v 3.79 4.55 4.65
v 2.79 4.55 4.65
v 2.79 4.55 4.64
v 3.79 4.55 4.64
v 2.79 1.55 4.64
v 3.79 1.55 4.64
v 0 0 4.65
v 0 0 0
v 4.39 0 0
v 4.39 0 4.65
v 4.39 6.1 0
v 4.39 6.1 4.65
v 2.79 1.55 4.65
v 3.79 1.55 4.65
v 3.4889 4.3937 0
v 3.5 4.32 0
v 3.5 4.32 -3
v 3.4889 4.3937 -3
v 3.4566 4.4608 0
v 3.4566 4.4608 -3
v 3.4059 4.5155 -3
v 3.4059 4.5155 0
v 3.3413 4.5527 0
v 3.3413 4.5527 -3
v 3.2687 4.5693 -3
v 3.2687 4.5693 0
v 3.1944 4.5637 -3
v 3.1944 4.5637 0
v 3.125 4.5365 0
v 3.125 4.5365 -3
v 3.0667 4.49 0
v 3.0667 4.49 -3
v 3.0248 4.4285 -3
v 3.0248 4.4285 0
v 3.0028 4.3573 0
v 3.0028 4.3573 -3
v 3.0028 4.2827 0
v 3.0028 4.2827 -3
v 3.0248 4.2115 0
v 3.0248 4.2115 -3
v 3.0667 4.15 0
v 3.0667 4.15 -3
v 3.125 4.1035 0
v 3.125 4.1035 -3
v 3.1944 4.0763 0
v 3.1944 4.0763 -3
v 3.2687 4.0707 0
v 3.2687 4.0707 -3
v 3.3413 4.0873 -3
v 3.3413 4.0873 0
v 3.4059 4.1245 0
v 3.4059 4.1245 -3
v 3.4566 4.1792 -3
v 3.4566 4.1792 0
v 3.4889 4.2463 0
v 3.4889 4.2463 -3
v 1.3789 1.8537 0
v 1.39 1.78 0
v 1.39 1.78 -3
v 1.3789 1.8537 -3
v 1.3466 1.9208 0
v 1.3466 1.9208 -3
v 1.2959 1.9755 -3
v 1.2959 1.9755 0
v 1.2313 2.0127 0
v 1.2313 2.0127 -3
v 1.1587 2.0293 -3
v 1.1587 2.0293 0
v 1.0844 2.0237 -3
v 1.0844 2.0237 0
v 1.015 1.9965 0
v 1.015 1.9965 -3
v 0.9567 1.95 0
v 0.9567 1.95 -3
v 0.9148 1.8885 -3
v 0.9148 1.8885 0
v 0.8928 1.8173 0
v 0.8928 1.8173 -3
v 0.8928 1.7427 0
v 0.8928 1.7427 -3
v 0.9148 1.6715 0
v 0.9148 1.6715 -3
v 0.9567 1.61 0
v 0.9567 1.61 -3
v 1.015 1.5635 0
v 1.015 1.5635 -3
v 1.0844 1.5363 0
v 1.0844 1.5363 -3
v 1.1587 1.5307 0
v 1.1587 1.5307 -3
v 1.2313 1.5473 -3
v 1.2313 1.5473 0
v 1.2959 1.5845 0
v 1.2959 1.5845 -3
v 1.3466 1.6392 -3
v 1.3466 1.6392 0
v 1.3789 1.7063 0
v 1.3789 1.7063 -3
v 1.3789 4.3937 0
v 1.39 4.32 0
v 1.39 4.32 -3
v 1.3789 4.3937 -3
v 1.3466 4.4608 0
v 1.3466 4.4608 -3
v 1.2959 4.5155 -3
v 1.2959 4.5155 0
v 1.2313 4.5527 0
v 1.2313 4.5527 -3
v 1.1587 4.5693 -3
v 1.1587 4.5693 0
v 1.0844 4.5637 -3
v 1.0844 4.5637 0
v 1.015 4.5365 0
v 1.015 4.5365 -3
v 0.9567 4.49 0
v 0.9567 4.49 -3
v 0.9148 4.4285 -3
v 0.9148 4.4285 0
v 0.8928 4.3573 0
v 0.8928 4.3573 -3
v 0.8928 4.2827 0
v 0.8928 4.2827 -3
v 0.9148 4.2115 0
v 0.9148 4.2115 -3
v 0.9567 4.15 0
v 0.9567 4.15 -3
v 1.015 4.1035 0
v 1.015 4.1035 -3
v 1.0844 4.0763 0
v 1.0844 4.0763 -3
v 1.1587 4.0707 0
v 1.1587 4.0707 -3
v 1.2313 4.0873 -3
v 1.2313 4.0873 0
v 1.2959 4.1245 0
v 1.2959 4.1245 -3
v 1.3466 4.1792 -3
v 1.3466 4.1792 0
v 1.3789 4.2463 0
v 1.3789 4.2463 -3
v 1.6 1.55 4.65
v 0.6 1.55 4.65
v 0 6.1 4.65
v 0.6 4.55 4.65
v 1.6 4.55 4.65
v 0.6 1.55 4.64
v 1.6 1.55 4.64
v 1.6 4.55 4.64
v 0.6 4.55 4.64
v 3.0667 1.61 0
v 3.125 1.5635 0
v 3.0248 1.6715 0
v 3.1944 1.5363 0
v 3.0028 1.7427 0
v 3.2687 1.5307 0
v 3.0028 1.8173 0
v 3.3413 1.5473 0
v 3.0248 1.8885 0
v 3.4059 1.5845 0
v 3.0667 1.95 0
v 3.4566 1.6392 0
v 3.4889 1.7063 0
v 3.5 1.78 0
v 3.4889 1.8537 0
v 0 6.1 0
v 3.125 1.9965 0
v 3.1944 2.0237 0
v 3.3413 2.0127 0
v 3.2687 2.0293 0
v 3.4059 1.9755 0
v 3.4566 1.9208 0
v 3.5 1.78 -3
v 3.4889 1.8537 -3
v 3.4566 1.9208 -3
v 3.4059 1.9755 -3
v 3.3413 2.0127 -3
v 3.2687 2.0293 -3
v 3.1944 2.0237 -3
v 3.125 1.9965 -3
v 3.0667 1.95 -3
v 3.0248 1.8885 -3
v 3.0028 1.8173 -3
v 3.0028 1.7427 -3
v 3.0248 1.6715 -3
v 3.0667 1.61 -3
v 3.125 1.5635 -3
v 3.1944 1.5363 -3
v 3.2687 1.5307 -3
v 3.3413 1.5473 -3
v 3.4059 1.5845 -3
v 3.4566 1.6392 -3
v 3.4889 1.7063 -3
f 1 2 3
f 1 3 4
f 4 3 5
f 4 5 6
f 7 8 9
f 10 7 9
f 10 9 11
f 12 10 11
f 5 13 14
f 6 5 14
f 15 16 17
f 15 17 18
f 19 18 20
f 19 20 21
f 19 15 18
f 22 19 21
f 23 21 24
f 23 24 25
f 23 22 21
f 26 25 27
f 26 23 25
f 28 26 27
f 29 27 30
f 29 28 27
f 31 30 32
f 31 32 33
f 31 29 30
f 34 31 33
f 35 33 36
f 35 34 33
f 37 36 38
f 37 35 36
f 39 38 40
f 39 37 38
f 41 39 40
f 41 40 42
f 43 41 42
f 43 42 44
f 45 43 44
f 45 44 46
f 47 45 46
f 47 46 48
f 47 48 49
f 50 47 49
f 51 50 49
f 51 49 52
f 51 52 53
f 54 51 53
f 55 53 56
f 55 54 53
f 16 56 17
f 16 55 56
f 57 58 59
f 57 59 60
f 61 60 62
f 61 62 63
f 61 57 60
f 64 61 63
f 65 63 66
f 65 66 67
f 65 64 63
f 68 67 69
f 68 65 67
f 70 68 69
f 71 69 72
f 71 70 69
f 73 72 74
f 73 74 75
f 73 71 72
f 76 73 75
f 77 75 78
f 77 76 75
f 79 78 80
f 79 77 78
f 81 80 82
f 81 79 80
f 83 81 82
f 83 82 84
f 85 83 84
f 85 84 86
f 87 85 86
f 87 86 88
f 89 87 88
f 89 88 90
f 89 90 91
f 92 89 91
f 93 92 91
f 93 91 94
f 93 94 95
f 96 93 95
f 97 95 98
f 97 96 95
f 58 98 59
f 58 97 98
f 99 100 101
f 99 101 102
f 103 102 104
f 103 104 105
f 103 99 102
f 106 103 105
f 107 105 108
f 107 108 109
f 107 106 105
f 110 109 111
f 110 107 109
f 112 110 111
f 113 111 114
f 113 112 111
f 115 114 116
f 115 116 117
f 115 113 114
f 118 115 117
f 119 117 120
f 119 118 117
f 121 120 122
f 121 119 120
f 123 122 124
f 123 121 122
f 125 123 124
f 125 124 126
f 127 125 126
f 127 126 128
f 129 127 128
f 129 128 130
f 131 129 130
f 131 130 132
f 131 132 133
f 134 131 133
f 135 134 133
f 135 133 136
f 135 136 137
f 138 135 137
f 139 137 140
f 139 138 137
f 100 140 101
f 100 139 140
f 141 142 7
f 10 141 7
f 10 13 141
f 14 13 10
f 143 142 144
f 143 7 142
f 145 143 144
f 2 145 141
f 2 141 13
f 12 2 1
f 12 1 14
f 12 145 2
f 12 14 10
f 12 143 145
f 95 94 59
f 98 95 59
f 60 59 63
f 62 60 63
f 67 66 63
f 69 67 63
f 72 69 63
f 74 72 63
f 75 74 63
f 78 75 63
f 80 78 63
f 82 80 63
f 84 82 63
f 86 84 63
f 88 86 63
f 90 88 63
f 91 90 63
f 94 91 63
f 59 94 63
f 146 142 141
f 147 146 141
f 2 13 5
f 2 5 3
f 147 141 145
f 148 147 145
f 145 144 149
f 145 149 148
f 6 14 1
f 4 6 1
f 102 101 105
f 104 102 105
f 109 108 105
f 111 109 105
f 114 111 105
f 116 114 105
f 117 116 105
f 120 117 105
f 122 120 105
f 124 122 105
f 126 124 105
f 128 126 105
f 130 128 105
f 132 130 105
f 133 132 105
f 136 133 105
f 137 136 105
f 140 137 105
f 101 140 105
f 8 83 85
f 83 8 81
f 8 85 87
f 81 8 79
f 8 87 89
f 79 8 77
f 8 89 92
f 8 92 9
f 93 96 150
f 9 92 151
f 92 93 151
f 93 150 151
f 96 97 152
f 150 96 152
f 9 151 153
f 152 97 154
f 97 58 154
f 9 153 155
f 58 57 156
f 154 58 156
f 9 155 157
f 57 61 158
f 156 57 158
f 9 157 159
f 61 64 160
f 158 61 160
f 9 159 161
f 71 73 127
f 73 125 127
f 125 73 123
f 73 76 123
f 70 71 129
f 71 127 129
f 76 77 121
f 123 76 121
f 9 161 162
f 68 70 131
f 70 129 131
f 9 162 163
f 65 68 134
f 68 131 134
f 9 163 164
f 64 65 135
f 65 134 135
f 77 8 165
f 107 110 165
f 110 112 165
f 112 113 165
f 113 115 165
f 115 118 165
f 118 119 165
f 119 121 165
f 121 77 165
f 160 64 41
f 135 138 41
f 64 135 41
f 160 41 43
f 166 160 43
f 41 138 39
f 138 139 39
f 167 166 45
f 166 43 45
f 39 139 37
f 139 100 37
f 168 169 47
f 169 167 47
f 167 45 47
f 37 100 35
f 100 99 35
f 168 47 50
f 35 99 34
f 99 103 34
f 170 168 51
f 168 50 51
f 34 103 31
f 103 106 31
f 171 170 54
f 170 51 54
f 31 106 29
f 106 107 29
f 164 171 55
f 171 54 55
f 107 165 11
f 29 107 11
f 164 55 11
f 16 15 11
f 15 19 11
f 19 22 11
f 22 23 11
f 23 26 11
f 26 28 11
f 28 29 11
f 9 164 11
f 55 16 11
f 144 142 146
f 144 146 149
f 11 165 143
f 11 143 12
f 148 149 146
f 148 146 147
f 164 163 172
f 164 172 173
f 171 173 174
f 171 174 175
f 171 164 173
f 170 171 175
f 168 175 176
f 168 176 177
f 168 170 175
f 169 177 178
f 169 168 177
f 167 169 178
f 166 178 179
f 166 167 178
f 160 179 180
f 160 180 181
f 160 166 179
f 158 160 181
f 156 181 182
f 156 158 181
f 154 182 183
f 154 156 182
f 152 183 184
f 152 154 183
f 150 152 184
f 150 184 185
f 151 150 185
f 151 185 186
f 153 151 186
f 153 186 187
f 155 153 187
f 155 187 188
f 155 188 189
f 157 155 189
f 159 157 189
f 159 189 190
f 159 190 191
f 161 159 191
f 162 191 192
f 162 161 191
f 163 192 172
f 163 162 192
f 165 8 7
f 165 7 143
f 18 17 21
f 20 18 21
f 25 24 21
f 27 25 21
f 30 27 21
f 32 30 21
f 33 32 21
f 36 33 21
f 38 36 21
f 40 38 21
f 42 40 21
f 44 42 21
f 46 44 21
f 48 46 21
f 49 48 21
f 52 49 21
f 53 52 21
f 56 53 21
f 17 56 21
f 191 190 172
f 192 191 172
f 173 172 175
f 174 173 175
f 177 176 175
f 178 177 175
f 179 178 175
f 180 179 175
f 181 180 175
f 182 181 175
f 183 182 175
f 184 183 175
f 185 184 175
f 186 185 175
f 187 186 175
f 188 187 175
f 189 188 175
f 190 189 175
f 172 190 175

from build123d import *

# Parameters (mm, degrees)
SKETCH_1_W          = 4.39
SKETCH_1_H          = 6.1
EXTRUDE_1_DEPTH     = 4.65
SKETCH_2_W          = 1
SKETCH_2_H          = 3
CUT_EXTRUDE_1_DEPTH = 0.01
SKETCH_3_R          = 0.25
EXTRUDE_2_DEPTH     = 3


with BuildPart() as part:
    # Эскиз1 → Бобышка-Вытянуть1 (new body)
    with BuildSketch(Plane.XY):
        with Locations((2.195, 3.05)):
            Rectangle(SKETCH_1_W, SKETCH_1_H)
    extrude(amount=EXTRUDE_1_DEPTH)

    # Эскиз2 → Вырез-Вытянуть1 (cut)
    with BuildSketch(Plane.XY.offset(4.65)):
        with Locations((1.1, 3.05)):
            Rectangle(SKETCH_2_W, SKETCH_2_H)
        with Locations((3.29, 3.05)):
            Rectangle(SKETCH_2_W, SKETCH_2_H)
    extrude(amount=-CUT_EXTRUDE_1_DEPTH, mode=Mode.SUBTRACT)

    # Эскиз3 → Бобышка-Вытянуть2 (add)
    with BuildSketch(Plane.XY):
        with Locations((1.14, 1.78)):
            Circle(SKETCH_3_R)
        with Locations((3.25, 1.78)):
            Circle(SKETCH_3_R)
        with Locations((3.25, 4.32)):
            Circle(SKETCH_3_R)
        with Locations((1.14, 4.32)):
            Circle(SKETCH_3_R)
    extrude(amount=-EXTRUDE_2_DEPTH)


solid = part.part
